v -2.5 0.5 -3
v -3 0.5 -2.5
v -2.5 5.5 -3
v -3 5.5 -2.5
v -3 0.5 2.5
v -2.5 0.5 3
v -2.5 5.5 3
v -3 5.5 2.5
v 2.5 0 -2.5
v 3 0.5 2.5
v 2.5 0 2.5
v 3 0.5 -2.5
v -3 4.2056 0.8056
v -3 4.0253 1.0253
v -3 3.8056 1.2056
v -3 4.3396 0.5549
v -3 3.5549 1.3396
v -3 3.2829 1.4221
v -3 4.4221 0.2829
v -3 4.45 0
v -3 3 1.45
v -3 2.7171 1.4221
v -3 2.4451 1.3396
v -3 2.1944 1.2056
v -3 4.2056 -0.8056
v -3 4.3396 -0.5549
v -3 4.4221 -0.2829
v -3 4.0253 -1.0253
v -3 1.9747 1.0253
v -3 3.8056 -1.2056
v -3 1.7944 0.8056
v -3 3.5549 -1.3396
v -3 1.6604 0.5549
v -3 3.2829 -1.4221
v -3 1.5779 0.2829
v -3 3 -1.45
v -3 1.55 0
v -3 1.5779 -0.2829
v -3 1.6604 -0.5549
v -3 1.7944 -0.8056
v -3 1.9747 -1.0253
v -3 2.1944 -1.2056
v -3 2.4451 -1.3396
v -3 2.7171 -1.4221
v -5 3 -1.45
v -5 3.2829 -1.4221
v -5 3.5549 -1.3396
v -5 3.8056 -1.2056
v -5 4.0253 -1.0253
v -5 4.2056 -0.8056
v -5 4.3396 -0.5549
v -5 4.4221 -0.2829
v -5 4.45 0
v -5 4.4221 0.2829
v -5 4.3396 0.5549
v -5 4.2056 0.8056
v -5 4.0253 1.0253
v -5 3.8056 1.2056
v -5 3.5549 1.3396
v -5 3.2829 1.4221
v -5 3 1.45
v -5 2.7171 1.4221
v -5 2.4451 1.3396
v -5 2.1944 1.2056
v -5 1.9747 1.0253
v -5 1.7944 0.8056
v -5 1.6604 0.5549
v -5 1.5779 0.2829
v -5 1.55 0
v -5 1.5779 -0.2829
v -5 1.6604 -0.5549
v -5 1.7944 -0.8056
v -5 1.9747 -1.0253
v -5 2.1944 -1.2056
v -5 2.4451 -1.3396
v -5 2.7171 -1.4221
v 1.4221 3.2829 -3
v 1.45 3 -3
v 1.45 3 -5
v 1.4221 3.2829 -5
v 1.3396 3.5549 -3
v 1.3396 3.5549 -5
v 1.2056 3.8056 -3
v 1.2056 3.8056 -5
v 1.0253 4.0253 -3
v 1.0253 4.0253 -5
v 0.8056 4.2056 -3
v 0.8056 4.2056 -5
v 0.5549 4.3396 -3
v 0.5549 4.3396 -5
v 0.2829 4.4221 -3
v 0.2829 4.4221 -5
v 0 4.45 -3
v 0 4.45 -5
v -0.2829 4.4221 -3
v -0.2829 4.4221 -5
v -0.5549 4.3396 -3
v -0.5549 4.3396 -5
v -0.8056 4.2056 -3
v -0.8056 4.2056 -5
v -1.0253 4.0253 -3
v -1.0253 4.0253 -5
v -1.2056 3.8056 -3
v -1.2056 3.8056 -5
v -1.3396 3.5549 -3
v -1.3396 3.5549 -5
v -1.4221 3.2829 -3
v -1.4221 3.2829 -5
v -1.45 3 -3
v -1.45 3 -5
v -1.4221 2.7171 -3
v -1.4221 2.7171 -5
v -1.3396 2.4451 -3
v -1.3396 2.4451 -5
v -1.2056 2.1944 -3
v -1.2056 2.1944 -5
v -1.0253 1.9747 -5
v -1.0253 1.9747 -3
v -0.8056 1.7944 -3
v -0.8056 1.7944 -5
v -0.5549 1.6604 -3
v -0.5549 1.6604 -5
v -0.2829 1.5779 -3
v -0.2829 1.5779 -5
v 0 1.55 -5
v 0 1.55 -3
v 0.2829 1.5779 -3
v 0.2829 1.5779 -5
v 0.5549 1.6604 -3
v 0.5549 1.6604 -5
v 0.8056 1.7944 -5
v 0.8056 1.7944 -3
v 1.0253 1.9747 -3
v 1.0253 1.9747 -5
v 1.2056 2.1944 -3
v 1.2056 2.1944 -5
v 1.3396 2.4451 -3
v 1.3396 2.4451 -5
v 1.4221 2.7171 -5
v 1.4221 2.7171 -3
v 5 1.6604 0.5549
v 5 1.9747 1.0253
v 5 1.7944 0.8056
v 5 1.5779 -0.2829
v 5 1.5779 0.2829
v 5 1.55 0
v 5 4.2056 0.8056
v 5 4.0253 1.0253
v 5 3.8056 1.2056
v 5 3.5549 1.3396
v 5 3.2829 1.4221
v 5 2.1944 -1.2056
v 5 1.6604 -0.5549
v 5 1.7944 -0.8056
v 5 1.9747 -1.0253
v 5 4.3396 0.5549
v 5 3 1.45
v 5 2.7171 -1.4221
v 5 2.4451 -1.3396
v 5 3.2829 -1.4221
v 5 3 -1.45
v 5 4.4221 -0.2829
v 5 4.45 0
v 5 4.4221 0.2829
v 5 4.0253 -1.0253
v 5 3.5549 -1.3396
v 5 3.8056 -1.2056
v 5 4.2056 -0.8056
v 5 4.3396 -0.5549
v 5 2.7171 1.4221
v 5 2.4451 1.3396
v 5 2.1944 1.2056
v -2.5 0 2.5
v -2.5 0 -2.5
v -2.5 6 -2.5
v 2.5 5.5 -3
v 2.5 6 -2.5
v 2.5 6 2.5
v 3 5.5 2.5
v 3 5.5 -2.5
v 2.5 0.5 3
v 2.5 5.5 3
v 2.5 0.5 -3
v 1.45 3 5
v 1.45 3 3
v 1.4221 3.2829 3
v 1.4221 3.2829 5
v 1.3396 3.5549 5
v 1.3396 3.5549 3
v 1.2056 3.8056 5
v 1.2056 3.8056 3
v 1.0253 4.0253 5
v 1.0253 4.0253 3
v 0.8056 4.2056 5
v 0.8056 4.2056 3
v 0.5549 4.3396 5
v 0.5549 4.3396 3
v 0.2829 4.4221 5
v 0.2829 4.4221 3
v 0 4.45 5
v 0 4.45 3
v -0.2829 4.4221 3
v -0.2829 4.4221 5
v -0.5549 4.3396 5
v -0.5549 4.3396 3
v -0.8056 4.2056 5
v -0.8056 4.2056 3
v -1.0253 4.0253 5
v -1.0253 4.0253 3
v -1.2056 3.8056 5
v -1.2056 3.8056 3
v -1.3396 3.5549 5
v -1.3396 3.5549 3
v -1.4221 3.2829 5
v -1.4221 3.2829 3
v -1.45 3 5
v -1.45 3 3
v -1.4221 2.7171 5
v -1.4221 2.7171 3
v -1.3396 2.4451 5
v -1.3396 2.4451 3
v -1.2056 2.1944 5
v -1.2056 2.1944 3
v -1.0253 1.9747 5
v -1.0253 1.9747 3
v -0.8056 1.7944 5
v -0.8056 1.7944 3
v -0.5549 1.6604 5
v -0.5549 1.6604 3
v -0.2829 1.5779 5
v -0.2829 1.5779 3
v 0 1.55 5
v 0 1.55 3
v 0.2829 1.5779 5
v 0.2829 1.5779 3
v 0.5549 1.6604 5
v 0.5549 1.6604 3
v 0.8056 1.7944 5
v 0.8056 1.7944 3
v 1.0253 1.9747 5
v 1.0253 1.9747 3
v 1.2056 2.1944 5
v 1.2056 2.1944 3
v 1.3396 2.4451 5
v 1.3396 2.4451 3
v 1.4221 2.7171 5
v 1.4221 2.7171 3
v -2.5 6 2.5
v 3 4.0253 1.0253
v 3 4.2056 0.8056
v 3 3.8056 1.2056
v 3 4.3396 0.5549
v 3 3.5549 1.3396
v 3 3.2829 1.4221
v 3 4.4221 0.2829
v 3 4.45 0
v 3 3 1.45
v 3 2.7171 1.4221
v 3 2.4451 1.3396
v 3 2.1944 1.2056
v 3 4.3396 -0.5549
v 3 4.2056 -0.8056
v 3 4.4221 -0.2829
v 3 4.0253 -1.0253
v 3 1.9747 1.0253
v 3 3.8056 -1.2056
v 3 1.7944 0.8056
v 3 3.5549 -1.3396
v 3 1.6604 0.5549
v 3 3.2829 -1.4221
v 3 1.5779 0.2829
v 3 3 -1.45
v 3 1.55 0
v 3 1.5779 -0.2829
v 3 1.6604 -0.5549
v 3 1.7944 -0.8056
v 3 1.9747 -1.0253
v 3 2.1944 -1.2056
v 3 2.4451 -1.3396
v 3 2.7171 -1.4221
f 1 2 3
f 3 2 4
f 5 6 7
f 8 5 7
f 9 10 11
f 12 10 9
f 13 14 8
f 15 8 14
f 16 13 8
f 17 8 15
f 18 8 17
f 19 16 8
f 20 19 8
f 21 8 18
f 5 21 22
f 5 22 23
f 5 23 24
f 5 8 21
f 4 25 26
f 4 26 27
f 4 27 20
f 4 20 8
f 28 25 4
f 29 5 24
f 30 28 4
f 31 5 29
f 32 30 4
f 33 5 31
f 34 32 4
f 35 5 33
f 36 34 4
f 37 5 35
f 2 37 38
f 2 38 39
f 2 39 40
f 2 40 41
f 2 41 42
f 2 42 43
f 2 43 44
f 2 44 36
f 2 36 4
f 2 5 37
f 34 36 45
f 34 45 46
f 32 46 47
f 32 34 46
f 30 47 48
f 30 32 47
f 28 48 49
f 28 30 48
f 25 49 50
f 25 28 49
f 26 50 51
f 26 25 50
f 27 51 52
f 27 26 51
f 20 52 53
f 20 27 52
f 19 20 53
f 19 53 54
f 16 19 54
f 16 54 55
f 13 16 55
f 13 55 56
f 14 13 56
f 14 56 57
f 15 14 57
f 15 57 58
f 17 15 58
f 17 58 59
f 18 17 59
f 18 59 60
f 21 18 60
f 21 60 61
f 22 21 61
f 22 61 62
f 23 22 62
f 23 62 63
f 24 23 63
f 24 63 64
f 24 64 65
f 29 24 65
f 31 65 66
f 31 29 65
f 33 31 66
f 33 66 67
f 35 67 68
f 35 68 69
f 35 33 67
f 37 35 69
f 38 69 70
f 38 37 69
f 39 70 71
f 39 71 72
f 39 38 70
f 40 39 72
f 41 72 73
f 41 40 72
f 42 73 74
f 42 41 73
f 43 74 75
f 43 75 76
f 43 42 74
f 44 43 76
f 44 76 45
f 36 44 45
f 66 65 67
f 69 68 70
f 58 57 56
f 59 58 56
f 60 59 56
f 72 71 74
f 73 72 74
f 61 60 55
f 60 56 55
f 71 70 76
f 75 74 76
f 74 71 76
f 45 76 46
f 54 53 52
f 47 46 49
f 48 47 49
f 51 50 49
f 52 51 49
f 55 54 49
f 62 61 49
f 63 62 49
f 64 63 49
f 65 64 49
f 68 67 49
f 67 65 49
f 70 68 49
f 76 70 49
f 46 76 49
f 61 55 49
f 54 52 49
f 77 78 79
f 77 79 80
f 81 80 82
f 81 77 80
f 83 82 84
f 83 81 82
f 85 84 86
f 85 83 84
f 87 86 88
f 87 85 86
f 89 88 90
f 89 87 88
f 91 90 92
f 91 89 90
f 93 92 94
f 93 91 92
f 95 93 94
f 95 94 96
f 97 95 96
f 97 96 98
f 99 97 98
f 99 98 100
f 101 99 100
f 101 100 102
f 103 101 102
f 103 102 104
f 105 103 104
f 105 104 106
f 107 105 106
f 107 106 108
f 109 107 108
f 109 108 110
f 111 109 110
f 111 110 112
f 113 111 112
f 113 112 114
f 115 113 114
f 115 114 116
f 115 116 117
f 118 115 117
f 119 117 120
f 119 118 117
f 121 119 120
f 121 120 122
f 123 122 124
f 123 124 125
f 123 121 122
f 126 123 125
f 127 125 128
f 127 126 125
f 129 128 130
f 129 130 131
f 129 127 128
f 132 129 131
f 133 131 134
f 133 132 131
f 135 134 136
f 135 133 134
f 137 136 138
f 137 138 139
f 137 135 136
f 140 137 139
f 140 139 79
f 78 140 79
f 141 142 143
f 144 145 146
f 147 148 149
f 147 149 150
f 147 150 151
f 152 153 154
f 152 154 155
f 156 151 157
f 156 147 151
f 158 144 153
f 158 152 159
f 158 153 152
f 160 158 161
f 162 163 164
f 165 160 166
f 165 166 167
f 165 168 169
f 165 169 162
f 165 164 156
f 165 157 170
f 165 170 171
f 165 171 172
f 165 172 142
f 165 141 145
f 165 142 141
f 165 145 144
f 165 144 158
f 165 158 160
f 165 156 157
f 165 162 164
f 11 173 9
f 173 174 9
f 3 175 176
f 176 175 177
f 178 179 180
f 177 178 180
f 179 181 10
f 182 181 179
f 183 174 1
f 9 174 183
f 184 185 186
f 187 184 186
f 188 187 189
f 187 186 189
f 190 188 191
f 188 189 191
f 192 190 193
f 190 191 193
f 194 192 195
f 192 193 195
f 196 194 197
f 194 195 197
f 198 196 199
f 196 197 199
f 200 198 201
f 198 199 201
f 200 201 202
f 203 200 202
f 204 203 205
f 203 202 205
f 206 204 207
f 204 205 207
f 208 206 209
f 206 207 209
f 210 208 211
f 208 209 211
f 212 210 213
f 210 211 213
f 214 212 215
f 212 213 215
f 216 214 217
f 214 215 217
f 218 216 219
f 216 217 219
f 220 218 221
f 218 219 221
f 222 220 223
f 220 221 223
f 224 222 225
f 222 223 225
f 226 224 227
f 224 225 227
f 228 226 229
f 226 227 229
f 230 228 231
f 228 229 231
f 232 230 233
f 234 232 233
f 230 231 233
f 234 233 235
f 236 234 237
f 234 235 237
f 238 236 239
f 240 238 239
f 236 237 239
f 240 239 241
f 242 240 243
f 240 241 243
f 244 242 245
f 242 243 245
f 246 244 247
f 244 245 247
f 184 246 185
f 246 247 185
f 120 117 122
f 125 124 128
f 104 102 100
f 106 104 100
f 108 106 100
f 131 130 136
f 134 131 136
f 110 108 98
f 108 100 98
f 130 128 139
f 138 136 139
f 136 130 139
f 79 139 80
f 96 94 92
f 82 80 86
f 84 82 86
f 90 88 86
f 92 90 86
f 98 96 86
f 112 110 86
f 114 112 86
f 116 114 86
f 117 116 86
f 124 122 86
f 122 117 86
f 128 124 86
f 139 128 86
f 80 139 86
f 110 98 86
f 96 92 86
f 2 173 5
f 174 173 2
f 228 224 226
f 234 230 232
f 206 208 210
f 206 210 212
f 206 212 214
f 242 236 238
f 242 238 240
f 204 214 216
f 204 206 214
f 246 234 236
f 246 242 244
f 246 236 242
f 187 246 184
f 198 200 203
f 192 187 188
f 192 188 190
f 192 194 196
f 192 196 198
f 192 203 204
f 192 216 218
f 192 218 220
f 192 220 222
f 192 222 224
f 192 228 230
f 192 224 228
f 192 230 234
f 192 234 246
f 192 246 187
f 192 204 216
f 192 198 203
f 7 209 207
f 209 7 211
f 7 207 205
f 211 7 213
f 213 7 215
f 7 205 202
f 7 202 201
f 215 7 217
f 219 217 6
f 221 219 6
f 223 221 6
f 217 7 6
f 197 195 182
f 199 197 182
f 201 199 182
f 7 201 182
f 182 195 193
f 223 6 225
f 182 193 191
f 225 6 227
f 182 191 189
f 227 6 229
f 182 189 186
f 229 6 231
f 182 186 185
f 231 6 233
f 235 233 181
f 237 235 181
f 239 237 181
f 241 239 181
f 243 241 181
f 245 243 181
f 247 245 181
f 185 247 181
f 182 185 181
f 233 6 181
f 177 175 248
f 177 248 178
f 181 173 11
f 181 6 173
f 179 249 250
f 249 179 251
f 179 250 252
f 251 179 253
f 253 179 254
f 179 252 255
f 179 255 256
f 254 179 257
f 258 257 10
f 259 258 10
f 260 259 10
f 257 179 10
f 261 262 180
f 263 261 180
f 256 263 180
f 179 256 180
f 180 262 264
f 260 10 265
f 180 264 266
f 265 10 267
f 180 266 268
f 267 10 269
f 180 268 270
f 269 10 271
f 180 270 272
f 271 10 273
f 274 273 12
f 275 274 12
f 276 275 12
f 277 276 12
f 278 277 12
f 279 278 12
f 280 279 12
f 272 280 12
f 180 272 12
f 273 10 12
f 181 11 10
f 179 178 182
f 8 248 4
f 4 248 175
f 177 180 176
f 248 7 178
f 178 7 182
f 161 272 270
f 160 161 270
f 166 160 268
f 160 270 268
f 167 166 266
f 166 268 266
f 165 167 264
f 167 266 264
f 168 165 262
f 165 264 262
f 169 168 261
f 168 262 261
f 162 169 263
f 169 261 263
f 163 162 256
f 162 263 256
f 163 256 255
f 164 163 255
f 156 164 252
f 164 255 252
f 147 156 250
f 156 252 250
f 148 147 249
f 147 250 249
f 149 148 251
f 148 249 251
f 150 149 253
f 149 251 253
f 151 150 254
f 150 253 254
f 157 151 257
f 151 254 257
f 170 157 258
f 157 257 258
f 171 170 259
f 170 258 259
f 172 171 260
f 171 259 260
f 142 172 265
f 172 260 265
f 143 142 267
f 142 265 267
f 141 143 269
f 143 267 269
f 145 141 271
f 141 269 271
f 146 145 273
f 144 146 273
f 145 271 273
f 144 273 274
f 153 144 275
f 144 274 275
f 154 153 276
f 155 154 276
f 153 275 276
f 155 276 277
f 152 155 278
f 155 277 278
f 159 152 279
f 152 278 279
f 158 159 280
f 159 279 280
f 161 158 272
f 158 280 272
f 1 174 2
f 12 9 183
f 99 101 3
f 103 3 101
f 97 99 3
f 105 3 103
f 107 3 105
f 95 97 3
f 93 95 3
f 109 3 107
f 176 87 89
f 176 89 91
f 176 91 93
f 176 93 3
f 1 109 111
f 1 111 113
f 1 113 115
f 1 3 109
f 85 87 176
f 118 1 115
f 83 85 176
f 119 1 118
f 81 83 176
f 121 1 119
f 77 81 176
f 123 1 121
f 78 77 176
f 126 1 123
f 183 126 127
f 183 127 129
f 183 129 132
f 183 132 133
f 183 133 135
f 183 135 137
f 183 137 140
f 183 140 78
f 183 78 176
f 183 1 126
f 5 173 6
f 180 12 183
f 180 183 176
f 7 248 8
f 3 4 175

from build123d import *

# Parameters (mm, degrees)
SKETCH1_W                = 6
SKETCH1_H                = 6
BOSS_EXTRUDE1_DEPTH      = 6
SKETCH2_R                = 1.45
BOSS_EXTRUDE2_DEPTH      = 2
BOSS_EXTRUDE2_DEPTH_BACK = 8
SKETCH3_R                = 1.45
BOSS_EXTRUDE3_DEPTH      = 2
BOSS_EXTRUDE3_DEPTH_BACK = 8
CHAMFER1_SIZE            = 0.5


with BuildPart() as part:
    # Sketch1 → Boss-Extrude1 (new body)
    with BuildSketch(Plane(origin=(0, 0, 0), x_dir=(1, 0, 0), z_dir=(0, 1, 0))):
        Rectangle(SKETCH1_W, SKETCH1_H)
    extrude(amount=BOSS_EXTRUDE1_DEPTH)

    # Sketch2 → Boss-Extrude2 (add, two sides)
    with BuildSketch(Plane(origin=(3, 0, 0), x_dir=(0, 0, -1), z_dir=(1, 0, 0))) as boss_extrude2_sk:
        with Locations((0, 3)):
            Circle(SKETCH2_R)
    extrude(amount=BOSS_EXTRUDE2_DEPTH)
    extrude(boss_extrude2_sk.sketch, amount=-BOSS_EXTRUDE2_DEPTH_BACK)

    # Sketch3 → Boss-Extrude3 (add, two sides)
    with BuildSketch(Plane.XY.offset(3)) as boss_extrude3_sk:
        with Locations((0, 3)):
            Circle(SKETCH3_R)
    extrude(amount=BOSS_EXTRUDE3_DEPTH)
    extrude(boss_extrude3_sk.sketch, amount=-BOSS_EXTRUDE3_DEPTH_BACK)

    # Chamfer1
    chamfer1_edges = [part.edges().sort_by_distance(p)[0] for p in [
        (-3, 6, 0),
        (0, 6, 3),
        (3, 6, 0),
        (0, 0, 3),
        (-3, 0, 0),
        (0, 0, -3),
        (3, 0, 0),
        (3, 3, 3),
        (-3, 3, 3),
        (-3, 3, -3),
        (3, 3, -3),
        (0, 6, -3),
    ]]
    chamfer(chamfer1_edges, length=CHAMFER1_SIZE)


solid = part.part
